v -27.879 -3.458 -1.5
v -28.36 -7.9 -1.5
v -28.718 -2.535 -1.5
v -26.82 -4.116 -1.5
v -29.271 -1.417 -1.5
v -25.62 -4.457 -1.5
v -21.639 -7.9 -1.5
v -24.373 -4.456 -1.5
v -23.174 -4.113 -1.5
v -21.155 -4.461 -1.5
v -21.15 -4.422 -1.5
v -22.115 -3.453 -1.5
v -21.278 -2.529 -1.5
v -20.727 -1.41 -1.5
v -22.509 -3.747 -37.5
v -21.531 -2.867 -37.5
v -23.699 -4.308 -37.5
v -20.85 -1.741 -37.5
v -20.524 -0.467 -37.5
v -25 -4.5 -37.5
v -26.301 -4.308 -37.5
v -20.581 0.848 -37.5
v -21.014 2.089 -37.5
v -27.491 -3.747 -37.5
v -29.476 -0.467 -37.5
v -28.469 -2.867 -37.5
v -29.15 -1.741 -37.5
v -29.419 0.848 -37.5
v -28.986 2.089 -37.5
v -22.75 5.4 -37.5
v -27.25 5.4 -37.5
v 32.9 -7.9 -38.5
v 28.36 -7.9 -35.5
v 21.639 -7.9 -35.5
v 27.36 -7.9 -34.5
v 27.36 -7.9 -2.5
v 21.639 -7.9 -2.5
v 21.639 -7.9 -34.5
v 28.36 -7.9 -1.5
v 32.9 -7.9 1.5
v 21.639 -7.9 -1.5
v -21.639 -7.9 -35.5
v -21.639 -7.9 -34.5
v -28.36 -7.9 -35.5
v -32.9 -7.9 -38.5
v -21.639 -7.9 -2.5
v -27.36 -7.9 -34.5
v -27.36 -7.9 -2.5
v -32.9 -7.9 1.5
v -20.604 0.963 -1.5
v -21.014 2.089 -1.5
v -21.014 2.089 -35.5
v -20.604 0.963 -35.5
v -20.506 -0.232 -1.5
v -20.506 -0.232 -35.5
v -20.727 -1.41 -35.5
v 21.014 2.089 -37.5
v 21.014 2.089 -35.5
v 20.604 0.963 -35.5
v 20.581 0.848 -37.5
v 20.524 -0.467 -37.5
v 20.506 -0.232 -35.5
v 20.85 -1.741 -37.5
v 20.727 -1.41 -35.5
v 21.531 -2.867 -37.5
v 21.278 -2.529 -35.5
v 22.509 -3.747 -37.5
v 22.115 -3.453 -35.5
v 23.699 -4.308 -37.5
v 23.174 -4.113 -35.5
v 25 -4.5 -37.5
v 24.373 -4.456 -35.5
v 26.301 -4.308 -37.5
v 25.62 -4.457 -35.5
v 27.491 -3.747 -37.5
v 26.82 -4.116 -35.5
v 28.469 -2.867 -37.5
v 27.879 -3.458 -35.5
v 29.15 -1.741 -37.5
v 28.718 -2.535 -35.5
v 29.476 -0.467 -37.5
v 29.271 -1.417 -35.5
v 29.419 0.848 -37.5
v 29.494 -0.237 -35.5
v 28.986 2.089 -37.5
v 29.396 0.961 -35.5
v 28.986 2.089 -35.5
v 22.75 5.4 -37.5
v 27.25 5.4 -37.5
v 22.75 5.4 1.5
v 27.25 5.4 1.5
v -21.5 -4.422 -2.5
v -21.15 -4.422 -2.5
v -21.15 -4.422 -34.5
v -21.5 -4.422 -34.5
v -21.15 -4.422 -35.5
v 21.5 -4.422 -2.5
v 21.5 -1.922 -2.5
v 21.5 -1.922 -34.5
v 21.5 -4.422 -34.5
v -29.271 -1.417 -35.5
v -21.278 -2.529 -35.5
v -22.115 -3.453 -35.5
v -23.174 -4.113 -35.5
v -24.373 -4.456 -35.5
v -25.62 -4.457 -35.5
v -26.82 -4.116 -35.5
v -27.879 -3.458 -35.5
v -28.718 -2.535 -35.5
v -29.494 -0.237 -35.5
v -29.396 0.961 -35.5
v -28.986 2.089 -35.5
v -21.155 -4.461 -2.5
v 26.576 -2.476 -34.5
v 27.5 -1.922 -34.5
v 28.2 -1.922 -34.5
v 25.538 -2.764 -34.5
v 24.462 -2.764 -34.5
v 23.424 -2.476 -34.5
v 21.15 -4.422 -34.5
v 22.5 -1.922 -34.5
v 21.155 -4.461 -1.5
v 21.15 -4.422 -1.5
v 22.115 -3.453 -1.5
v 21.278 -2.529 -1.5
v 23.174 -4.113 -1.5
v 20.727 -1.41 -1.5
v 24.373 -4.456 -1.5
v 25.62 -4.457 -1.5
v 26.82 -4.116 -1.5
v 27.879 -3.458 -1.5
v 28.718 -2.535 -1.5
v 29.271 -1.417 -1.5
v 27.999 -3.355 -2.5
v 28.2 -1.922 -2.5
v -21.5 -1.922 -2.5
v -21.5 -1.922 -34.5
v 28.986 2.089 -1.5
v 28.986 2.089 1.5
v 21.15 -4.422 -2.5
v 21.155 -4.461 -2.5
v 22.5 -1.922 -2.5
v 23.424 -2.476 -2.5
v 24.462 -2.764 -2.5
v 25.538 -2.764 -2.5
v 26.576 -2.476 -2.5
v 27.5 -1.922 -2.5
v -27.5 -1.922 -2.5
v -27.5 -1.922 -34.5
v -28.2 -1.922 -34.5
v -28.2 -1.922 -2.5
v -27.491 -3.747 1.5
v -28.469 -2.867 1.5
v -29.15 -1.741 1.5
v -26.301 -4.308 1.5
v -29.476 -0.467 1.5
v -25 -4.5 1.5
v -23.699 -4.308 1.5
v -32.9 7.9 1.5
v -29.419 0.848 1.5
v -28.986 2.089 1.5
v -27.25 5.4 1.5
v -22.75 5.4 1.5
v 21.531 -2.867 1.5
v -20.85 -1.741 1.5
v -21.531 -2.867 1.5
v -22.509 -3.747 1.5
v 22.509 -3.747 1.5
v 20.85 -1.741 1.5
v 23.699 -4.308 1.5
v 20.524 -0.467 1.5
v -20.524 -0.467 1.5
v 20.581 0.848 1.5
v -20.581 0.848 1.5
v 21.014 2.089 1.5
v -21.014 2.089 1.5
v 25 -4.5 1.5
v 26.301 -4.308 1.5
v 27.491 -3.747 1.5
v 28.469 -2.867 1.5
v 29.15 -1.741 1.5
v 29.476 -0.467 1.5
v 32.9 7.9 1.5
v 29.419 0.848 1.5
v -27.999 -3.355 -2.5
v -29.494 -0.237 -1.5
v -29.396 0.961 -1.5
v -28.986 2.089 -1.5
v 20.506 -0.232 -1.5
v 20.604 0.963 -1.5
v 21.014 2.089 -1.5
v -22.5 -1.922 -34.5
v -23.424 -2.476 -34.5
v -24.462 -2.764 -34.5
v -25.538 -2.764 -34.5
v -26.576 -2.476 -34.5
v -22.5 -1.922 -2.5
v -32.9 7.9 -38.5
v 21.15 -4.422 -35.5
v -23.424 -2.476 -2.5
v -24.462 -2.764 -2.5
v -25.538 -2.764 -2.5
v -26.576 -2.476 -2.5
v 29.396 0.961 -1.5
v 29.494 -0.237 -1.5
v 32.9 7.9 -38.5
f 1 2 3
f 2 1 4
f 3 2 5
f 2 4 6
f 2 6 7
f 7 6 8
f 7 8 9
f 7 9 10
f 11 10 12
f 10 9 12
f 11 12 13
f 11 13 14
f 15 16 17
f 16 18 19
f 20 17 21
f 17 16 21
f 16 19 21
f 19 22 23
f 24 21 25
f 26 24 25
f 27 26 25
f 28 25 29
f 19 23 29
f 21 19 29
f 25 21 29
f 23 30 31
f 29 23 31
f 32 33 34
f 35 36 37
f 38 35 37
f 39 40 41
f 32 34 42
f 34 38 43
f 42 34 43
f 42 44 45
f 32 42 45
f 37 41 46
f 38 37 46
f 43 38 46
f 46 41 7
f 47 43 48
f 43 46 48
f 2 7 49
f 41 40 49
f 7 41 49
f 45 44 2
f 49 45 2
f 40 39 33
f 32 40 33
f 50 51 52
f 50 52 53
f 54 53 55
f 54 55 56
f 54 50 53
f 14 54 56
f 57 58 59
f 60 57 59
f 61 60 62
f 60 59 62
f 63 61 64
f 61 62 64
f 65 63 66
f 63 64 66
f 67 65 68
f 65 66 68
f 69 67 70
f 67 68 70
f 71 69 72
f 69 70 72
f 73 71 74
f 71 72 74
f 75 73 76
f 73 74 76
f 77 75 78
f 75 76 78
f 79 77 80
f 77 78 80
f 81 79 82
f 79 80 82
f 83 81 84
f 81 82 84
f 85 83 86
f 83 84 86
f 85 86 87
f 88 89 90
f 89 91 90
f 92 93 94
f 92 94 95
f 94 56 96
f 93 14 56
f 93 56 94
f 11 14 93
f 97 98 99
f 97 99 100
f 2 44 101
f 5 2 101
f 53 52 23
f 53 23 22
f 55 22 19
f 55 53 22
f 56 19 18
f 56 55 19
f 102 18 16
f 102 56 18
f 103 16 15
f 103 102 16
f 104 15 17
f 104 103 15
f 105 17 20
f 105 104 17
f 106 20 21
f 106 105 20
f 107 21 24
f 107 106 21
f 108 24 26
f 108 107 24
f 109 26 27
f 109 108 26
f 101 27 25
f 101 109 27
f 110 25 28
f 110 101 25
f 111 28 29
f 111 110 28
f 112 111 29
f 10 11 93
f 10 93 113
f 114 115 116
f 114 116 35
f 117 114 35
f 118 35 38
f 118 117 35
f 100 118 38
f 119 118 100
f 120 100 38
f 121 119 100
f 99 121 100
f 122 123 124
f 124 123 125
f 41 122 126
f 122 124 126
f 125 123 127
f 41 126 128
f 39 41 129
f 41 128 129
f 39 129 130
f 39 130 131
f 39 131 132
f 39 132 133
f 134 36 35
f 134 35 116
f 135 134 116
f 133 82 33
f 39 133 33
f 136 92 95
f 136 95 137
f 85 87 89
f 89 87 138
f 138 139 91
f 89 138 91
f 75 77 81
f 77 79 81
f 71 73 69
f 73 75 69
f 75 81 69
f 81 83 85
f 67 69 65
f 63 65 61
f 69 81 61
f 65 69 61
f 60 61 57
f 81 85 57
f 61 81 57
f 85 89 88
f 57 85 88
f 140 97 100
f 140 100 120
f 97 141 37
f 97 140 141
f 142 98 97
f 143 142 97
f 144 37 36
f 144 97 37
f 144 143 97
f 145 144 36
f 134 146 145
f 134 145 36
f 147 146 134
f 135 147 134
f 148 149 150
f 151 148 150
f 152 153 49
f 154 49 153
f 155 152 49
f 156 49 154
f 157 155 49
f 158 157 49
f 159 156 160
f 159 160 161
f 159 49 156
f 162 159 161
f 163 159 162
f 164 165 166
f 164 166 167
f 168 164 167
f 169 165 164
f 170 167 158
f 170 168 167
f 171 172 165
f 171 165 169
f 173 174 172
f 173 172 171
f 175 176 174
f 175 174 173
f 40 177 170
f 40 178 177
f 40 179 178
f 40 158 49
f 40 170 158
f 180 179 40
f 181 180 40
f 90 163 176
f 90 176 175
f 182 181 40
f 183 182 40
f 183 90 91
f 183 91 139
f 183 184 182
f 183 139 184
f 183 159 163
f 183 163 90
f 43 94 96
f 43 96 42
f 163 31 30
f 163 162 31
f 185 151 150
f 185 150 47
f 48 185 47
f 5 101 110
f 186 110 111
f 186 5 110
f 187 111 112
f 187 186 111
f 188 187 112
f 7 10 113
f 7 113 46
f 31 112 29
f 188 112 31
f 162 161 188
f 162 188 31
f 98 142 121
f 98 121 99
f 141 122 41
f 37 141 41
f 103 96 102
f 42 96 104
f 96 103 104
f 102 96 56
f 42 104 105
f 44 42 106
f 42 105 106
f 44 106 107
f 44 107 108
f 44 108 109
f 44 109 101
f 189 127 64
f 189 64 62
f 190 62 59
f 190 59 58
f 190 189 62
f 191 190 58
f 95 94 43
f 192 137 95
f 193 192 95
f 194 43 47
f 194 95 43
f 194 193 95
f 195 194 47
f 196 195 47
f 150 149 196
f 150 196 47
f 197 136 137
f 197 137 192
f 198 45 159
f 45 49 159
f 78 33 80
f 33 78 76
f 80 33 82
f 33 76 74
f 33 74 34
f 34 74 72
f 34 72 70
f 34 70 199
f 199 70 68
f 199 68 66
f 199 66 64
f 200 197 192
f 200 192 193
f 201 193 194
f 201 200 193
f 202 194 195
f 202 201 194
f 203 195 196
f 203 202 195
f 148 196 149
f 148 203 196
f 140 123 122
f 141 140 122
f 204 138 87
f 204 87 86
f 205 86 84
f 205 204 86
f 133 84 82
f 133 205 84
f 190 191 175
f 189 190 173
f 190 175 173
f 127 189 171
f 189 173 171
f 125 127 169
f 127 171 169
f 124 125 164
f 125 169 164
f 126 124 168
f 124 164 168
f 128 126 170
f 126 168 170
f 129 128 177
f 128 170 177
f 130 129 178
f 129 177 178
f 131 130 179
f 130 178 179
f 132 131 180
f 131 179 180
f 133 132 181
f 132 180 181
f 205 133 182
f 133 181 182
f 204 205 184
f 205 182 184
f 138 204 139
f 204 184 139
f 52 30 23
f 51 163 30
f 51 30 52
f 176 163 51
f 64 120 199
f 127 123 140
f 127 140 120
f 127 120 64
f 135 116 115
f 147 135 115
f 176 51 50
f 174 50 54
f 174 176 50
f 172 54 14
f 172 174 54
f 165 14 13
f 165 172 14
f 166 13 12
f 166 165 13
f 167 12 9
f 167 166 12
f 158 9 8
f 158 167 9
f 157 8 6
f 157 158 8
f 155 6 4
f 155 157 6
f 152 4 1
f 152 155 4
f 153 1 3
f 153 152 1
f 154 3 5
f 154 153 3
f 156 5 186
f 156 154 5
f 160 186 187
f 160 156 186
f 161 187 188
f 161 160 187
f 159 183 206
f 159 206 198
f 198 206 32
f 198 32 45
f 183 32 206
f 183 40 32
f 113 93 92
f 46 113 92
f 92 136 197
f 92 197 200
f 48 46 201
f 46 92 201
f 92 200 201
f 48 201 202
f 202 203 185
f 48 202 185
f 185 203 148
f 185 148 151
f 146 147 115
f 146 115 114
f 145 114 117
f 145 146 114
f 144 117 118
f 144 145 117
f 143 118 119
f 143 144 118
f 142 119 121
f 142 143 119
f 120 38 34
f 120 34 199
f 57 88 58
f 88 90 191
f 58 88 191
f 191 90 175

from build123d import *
from build123d.topology import SkipClean

# Parameters (mm, degrees)
SCHIZZO2_W            = 65.8
SCHIZZO2_H            = 15.8
FRONT_DEPTH           = 1.5
INNER_DEPTH           = 34
FRONT_CLEARANCE_DEPTH = 1
BACK_START            = -1
BACK_CLEARANCE_DEPTH  = 1
SCHIZZO7_W            = 65.8
SCHIZZO7_H            = 15.8
BACK_DEPTH            = 2
SCHIZZO9_W            = 65.8
SCHIZZO9_H            = 15.8
BACK_CLOSING_DEPTH    = 1


with BuildPart() as part:
    # Schizzo2 → Front (new, symmetric)
    with BuildSketch(Plane.XY):
        Rectangle(SCHIZZO2_W, SCHIZZO2_H)
        with BuildLine():
            Line((-27.25, 5.4), (-22.75, 5.4))
            Line((-22.75, 5.4), (-21.014451547, 2.089354811))
            ThreePointArc((-21.014451547, 2.089354811), (-25, -4.5), (-28.985548453, 2.089354811))
            Line((-28.985548453, 2.089354811), (-27.25, 5.4))
        make_face(mode=Mode.SUBTRACT)
        with BuildLine():
            Line((27.25, 5.4), (22.75, 5.4))
            Line((22.75, 5.4), (21.014451547, 2.089354811))
            ThreePointArc((21.014451547, 2.089354811), (25, -4.5), (28.985548453, 2.089354811))
            Line((28.985548453, 2.089354811), (27.25, 5.4))
        make_face(mode=Mode.SUBTRACT)
    extrude(amount=FRONT_DEPTH, both=True)

    # Schizzo5 → Inner (add)
    with SkipClean():  # the faces are left unmerged after this step: merging them gives an invalid solid
        with BuildSketch(Plane(origin=(0, 0, -1.5), x_dir=(-1, 0, 0), z_dir=(0, 0, -1))):
            with BuildLine():
                Line((-25, -7.9), (-27.35991702, -7.9))
                Line((-27.35991702, -7.9), (-28.2, -1.922498999))
                Line((-28.2, -1.922498999), (-27.5, -1.922498999))
                ThreePointArc((-27.5, -1.922498999), (-25, -2.8), (-22.5, -1.922498999))
                Line((-22.5, -1.922498999), (-21.5, -1.922498999))
                Line((-21.5, -1.922498999), (-21.5, -4.422498999))
                Line((-21.5, -4.422498999), (-21.15, -4.422498999))
                Line((-21.15, -4.422498999), (-20.726632237, -1.410080834))
                ThreePointArc((-20.726632237, -1.410080834), (-20.515143622, 0.368867555), (-21.014451547, 2.089354811))
                Line((-21.014451547, 2.089354811), (-22.75, 5.4))
                Line((-22.75, 5.4), (-27.25, 5.4))
                Line((-27.25, 5.4), (-28.985548453, 2.089354811))
                ThreePointArc((-28.985548453, 2.089354811), (-29.485161475, 0.365139069), (-29.271017396, -1.417183969))
                Line((-29.271017396, -1.417183969), (-28.35991702, -7.9))
                Line((-28.35991702, -7.9), (-32.9, -7.9))
                Line((-32.9, -7.9), (-32.9, 7.9))
                Line((-32.9, 7.9), (32.9, 7.9))
                Line((32.9, 7.9), (32.9, -7.9))
                Line((32.9, -7.9), (28.35991702, -7.9))
                Line((28.35991702, -7.9), (29.271017396, -1.417183969))
                ThreePointArc((29.271017396, -1.417183969), (29.485161475, 0.365139069), (28.985548453, 2.089354811))
                Line((28.985548453, 2.089354811), (27.25, 5.4))
                Line((27.25, 5.4), (22.75, 5.4))
                Line((22.75, 5.4), (21.014451547, 2.089354811))
                ThreePointArc((21.014451547, 2.089354811), (20.515143622, 0.368867555), (20.726632237, -1.410080834))
                Line((20.726632237, -1.410080834), (21.15, -4.422498999))
                Line((21.15, -4.422498999), (21.5, -4.422498999))
                Line((21.5, -4.422498999), (21.5, -1.922498999))
                Line((21.5, -1.922498999), (22.5, -1.922498999))
                ThreePointArc((22.5, -1.922498999), (25, -2.8), (27.5, -1.922498999))
                Line((27.5, -1.922498999), (28.2, -1.922498999))
                Line((28.2, -1.922498999), (27.35991702, -7.9))
                Line((27.35991702, -7.9), (25, -7.9))
                Line((25, -7.9), (21.638730893, -7.9))
                Line((21.638730893, -7.9), (-21.638730893, -7.9))
                Line((-21.638730893, -7.9), (-25, -7.9))
            make_face()
        extrude(amount=INNER_DEPTH)

    # Schizzo13 → Front clearance (cut)
    with BuildSketch(Plane.XY.offset(-1.5)):
        with BuildLine():
            Line((-21.5, -2.828427125), (-21.5, -4.422498999))
            Line((-21.5, -4.422498999), (-21.15, -4.422498999))
            Line((-21.15, -4.422498999), (-21.155384602, -4.46081243))
            Line((-21.155384602, -4.46081243), (-21.638730893, -7.9))
            Line((-21.638730893, -7.9), (-27.35991702, -7.9))
            Line((-27.35991702, -7.9), (-27.998629063, -3.355327665))
            Line((-27.998629063, -3.355327665), (-28.2, -1.922498999))
            Line((-28.2, -1.922498999), (-27.5, -1.922498999))
            ThreePointArc((-27.5, -1.922498999), (-25, -2.8), (-22.5, -1.922498999))
            Line((-22.5, -1.922498999), (-21.5, -1.922498999))
            Line((-21.5, -1.922498999), (-21.5, -2.828427125))
        make_face()
        with BuildLine():
            Line((21.155384602, -4.46081243), (21.638730893, -7.9))
            Line((21.638730893, -7.9), (27.35991702, -7.9))
            Line((27.35991702, -7.9), (27.998629063, -3.355327665))
            Line((27.998629063, -3.355327665), (28.2, -1.922498999))
            Line((28.2, -1.922498999), (27.5, -1.922498999))
            ThreePointArc((27.5, -1.922498999), (25, -2.8), (22.5, -1.922498999))
            Line((22.5, -1.922498999), (21.5, -1.922498999))
            Line((21.5, -1.922498999), (21.5, -2.828427125))
            Line((21.5, -2.828427125), (21.5, -4.422498999))
            Line((21.5, -4.422498999), (21.15, -4.422498999))
            Line((21.15, -4.422498999), (21.155384602, -4.46081243))
        make_face()
    extrude(amount=-FRONT_CLEARANCE_DEPTH, mode=Mode.SUBTRACT)

    # Schizzo12 → Back clearance (cut)
    with BuildSketch(Plane(origin=(0, 0, -35.5), x_dir=(-1, 0, 0), z_dir=(0, 0, -1)).offset(BACK_START)):
        with BuildLine():
            Line((21.5, -1.922498999), (21.5, -4.422498999))
            Line((21.5, -4.422498999), (21.15, -4.422498999))
            Line((21.15, -4.422498999), (21.638730893, -7.9))
            Line((21.638730893, -7.9), (27.35991702, -7.9))
            Line((27.35991702, -7.9), (28.2, -1.922498999))
            Line((28.2, -1.922498999), (27.5, -1.922498999))
            ThreePointArc((27.5, -1.922498999), (25, -2.8), (22.5, -1.922498999))
            Line((22.5, -1.922498999), (21.5, -1.922498999))
        make_face()
        with BuildLine():
            Line((-27.35991702, -7.9), (-21.638730893, -7.9))
            Line((-21.638730893, -7.9), (-21.15, -4.422498999))
            Line((-21.15, -4.422498999), (-21.5, -4.422498999))
            Line((-21.5, -4.422498999), (-21.5, -1.922498999))
            Line((-21.5, -1.922498999), (-22.5, -1.922498999))
            ThreePointArc((-22.5, -1.922498999), (-25, -2.8), (-27.5, -1.922498999))
            Line((-27.5, -1.922498999), (-28.2, -1.922498999))
            Line((-28.2, -1.922498999), (-27.35991702, -7.9))
        make_face()
    extrude(amount=BACK_CLEARANCE_DEPTH, mode=Mode.SUBTRACT)

    # Schizzo7 → Back (add)
    with BuildSketch(Plane(origin=(0, 0, -35.5), x_dir=(-1, 0, 0), z_dir=(0, 0, -1))):
        Rectangle(SCHIZZO7_W, SCHIZZO7_H)
        with BuildLine():
            Line((22.75, 5.4), (21.014451547, 2.089354811))
            ThreePointArc((21.014451547, 2.089354811), (25, -4.5), (28.985548453, 2.089354811))
            Line((28.985548453, 2.089354811), (27.25, 5.4))
            Line((27.25, 5.4), (22.75, 5.4))
        make_face(mode=Mode.SUBTRACT)
        with BuildLine():
            Line((-27.25, 5.4), (-22.75, 5.4))
            Line((-22.75, 5.4), (-21.014451547, 2.089354811))
            ThreePointArc((-21.014451547, 2.089354811), (-25, -4.5), (-28.985548453, 2.089354811))
            Line((-28.985548453, 2.089354811), (-27.25, 5.4))
        make_face(mode=Mode.SUBTRACT)
    extrude(amount=BACK_DEPTH)

    # Schizzo9 → Back closing (add)
    with BuildSketch(Plane(origin=(0, 0, -37.5), x_dir=(-1, 0, 0), z_dir=(0, 0, -1))):
        Rectangle(SCHIZZO9_W, SCHIZZO9_H)
    extrude(amount=BACK_CLOSING_DEPTH)


solid = part.part
